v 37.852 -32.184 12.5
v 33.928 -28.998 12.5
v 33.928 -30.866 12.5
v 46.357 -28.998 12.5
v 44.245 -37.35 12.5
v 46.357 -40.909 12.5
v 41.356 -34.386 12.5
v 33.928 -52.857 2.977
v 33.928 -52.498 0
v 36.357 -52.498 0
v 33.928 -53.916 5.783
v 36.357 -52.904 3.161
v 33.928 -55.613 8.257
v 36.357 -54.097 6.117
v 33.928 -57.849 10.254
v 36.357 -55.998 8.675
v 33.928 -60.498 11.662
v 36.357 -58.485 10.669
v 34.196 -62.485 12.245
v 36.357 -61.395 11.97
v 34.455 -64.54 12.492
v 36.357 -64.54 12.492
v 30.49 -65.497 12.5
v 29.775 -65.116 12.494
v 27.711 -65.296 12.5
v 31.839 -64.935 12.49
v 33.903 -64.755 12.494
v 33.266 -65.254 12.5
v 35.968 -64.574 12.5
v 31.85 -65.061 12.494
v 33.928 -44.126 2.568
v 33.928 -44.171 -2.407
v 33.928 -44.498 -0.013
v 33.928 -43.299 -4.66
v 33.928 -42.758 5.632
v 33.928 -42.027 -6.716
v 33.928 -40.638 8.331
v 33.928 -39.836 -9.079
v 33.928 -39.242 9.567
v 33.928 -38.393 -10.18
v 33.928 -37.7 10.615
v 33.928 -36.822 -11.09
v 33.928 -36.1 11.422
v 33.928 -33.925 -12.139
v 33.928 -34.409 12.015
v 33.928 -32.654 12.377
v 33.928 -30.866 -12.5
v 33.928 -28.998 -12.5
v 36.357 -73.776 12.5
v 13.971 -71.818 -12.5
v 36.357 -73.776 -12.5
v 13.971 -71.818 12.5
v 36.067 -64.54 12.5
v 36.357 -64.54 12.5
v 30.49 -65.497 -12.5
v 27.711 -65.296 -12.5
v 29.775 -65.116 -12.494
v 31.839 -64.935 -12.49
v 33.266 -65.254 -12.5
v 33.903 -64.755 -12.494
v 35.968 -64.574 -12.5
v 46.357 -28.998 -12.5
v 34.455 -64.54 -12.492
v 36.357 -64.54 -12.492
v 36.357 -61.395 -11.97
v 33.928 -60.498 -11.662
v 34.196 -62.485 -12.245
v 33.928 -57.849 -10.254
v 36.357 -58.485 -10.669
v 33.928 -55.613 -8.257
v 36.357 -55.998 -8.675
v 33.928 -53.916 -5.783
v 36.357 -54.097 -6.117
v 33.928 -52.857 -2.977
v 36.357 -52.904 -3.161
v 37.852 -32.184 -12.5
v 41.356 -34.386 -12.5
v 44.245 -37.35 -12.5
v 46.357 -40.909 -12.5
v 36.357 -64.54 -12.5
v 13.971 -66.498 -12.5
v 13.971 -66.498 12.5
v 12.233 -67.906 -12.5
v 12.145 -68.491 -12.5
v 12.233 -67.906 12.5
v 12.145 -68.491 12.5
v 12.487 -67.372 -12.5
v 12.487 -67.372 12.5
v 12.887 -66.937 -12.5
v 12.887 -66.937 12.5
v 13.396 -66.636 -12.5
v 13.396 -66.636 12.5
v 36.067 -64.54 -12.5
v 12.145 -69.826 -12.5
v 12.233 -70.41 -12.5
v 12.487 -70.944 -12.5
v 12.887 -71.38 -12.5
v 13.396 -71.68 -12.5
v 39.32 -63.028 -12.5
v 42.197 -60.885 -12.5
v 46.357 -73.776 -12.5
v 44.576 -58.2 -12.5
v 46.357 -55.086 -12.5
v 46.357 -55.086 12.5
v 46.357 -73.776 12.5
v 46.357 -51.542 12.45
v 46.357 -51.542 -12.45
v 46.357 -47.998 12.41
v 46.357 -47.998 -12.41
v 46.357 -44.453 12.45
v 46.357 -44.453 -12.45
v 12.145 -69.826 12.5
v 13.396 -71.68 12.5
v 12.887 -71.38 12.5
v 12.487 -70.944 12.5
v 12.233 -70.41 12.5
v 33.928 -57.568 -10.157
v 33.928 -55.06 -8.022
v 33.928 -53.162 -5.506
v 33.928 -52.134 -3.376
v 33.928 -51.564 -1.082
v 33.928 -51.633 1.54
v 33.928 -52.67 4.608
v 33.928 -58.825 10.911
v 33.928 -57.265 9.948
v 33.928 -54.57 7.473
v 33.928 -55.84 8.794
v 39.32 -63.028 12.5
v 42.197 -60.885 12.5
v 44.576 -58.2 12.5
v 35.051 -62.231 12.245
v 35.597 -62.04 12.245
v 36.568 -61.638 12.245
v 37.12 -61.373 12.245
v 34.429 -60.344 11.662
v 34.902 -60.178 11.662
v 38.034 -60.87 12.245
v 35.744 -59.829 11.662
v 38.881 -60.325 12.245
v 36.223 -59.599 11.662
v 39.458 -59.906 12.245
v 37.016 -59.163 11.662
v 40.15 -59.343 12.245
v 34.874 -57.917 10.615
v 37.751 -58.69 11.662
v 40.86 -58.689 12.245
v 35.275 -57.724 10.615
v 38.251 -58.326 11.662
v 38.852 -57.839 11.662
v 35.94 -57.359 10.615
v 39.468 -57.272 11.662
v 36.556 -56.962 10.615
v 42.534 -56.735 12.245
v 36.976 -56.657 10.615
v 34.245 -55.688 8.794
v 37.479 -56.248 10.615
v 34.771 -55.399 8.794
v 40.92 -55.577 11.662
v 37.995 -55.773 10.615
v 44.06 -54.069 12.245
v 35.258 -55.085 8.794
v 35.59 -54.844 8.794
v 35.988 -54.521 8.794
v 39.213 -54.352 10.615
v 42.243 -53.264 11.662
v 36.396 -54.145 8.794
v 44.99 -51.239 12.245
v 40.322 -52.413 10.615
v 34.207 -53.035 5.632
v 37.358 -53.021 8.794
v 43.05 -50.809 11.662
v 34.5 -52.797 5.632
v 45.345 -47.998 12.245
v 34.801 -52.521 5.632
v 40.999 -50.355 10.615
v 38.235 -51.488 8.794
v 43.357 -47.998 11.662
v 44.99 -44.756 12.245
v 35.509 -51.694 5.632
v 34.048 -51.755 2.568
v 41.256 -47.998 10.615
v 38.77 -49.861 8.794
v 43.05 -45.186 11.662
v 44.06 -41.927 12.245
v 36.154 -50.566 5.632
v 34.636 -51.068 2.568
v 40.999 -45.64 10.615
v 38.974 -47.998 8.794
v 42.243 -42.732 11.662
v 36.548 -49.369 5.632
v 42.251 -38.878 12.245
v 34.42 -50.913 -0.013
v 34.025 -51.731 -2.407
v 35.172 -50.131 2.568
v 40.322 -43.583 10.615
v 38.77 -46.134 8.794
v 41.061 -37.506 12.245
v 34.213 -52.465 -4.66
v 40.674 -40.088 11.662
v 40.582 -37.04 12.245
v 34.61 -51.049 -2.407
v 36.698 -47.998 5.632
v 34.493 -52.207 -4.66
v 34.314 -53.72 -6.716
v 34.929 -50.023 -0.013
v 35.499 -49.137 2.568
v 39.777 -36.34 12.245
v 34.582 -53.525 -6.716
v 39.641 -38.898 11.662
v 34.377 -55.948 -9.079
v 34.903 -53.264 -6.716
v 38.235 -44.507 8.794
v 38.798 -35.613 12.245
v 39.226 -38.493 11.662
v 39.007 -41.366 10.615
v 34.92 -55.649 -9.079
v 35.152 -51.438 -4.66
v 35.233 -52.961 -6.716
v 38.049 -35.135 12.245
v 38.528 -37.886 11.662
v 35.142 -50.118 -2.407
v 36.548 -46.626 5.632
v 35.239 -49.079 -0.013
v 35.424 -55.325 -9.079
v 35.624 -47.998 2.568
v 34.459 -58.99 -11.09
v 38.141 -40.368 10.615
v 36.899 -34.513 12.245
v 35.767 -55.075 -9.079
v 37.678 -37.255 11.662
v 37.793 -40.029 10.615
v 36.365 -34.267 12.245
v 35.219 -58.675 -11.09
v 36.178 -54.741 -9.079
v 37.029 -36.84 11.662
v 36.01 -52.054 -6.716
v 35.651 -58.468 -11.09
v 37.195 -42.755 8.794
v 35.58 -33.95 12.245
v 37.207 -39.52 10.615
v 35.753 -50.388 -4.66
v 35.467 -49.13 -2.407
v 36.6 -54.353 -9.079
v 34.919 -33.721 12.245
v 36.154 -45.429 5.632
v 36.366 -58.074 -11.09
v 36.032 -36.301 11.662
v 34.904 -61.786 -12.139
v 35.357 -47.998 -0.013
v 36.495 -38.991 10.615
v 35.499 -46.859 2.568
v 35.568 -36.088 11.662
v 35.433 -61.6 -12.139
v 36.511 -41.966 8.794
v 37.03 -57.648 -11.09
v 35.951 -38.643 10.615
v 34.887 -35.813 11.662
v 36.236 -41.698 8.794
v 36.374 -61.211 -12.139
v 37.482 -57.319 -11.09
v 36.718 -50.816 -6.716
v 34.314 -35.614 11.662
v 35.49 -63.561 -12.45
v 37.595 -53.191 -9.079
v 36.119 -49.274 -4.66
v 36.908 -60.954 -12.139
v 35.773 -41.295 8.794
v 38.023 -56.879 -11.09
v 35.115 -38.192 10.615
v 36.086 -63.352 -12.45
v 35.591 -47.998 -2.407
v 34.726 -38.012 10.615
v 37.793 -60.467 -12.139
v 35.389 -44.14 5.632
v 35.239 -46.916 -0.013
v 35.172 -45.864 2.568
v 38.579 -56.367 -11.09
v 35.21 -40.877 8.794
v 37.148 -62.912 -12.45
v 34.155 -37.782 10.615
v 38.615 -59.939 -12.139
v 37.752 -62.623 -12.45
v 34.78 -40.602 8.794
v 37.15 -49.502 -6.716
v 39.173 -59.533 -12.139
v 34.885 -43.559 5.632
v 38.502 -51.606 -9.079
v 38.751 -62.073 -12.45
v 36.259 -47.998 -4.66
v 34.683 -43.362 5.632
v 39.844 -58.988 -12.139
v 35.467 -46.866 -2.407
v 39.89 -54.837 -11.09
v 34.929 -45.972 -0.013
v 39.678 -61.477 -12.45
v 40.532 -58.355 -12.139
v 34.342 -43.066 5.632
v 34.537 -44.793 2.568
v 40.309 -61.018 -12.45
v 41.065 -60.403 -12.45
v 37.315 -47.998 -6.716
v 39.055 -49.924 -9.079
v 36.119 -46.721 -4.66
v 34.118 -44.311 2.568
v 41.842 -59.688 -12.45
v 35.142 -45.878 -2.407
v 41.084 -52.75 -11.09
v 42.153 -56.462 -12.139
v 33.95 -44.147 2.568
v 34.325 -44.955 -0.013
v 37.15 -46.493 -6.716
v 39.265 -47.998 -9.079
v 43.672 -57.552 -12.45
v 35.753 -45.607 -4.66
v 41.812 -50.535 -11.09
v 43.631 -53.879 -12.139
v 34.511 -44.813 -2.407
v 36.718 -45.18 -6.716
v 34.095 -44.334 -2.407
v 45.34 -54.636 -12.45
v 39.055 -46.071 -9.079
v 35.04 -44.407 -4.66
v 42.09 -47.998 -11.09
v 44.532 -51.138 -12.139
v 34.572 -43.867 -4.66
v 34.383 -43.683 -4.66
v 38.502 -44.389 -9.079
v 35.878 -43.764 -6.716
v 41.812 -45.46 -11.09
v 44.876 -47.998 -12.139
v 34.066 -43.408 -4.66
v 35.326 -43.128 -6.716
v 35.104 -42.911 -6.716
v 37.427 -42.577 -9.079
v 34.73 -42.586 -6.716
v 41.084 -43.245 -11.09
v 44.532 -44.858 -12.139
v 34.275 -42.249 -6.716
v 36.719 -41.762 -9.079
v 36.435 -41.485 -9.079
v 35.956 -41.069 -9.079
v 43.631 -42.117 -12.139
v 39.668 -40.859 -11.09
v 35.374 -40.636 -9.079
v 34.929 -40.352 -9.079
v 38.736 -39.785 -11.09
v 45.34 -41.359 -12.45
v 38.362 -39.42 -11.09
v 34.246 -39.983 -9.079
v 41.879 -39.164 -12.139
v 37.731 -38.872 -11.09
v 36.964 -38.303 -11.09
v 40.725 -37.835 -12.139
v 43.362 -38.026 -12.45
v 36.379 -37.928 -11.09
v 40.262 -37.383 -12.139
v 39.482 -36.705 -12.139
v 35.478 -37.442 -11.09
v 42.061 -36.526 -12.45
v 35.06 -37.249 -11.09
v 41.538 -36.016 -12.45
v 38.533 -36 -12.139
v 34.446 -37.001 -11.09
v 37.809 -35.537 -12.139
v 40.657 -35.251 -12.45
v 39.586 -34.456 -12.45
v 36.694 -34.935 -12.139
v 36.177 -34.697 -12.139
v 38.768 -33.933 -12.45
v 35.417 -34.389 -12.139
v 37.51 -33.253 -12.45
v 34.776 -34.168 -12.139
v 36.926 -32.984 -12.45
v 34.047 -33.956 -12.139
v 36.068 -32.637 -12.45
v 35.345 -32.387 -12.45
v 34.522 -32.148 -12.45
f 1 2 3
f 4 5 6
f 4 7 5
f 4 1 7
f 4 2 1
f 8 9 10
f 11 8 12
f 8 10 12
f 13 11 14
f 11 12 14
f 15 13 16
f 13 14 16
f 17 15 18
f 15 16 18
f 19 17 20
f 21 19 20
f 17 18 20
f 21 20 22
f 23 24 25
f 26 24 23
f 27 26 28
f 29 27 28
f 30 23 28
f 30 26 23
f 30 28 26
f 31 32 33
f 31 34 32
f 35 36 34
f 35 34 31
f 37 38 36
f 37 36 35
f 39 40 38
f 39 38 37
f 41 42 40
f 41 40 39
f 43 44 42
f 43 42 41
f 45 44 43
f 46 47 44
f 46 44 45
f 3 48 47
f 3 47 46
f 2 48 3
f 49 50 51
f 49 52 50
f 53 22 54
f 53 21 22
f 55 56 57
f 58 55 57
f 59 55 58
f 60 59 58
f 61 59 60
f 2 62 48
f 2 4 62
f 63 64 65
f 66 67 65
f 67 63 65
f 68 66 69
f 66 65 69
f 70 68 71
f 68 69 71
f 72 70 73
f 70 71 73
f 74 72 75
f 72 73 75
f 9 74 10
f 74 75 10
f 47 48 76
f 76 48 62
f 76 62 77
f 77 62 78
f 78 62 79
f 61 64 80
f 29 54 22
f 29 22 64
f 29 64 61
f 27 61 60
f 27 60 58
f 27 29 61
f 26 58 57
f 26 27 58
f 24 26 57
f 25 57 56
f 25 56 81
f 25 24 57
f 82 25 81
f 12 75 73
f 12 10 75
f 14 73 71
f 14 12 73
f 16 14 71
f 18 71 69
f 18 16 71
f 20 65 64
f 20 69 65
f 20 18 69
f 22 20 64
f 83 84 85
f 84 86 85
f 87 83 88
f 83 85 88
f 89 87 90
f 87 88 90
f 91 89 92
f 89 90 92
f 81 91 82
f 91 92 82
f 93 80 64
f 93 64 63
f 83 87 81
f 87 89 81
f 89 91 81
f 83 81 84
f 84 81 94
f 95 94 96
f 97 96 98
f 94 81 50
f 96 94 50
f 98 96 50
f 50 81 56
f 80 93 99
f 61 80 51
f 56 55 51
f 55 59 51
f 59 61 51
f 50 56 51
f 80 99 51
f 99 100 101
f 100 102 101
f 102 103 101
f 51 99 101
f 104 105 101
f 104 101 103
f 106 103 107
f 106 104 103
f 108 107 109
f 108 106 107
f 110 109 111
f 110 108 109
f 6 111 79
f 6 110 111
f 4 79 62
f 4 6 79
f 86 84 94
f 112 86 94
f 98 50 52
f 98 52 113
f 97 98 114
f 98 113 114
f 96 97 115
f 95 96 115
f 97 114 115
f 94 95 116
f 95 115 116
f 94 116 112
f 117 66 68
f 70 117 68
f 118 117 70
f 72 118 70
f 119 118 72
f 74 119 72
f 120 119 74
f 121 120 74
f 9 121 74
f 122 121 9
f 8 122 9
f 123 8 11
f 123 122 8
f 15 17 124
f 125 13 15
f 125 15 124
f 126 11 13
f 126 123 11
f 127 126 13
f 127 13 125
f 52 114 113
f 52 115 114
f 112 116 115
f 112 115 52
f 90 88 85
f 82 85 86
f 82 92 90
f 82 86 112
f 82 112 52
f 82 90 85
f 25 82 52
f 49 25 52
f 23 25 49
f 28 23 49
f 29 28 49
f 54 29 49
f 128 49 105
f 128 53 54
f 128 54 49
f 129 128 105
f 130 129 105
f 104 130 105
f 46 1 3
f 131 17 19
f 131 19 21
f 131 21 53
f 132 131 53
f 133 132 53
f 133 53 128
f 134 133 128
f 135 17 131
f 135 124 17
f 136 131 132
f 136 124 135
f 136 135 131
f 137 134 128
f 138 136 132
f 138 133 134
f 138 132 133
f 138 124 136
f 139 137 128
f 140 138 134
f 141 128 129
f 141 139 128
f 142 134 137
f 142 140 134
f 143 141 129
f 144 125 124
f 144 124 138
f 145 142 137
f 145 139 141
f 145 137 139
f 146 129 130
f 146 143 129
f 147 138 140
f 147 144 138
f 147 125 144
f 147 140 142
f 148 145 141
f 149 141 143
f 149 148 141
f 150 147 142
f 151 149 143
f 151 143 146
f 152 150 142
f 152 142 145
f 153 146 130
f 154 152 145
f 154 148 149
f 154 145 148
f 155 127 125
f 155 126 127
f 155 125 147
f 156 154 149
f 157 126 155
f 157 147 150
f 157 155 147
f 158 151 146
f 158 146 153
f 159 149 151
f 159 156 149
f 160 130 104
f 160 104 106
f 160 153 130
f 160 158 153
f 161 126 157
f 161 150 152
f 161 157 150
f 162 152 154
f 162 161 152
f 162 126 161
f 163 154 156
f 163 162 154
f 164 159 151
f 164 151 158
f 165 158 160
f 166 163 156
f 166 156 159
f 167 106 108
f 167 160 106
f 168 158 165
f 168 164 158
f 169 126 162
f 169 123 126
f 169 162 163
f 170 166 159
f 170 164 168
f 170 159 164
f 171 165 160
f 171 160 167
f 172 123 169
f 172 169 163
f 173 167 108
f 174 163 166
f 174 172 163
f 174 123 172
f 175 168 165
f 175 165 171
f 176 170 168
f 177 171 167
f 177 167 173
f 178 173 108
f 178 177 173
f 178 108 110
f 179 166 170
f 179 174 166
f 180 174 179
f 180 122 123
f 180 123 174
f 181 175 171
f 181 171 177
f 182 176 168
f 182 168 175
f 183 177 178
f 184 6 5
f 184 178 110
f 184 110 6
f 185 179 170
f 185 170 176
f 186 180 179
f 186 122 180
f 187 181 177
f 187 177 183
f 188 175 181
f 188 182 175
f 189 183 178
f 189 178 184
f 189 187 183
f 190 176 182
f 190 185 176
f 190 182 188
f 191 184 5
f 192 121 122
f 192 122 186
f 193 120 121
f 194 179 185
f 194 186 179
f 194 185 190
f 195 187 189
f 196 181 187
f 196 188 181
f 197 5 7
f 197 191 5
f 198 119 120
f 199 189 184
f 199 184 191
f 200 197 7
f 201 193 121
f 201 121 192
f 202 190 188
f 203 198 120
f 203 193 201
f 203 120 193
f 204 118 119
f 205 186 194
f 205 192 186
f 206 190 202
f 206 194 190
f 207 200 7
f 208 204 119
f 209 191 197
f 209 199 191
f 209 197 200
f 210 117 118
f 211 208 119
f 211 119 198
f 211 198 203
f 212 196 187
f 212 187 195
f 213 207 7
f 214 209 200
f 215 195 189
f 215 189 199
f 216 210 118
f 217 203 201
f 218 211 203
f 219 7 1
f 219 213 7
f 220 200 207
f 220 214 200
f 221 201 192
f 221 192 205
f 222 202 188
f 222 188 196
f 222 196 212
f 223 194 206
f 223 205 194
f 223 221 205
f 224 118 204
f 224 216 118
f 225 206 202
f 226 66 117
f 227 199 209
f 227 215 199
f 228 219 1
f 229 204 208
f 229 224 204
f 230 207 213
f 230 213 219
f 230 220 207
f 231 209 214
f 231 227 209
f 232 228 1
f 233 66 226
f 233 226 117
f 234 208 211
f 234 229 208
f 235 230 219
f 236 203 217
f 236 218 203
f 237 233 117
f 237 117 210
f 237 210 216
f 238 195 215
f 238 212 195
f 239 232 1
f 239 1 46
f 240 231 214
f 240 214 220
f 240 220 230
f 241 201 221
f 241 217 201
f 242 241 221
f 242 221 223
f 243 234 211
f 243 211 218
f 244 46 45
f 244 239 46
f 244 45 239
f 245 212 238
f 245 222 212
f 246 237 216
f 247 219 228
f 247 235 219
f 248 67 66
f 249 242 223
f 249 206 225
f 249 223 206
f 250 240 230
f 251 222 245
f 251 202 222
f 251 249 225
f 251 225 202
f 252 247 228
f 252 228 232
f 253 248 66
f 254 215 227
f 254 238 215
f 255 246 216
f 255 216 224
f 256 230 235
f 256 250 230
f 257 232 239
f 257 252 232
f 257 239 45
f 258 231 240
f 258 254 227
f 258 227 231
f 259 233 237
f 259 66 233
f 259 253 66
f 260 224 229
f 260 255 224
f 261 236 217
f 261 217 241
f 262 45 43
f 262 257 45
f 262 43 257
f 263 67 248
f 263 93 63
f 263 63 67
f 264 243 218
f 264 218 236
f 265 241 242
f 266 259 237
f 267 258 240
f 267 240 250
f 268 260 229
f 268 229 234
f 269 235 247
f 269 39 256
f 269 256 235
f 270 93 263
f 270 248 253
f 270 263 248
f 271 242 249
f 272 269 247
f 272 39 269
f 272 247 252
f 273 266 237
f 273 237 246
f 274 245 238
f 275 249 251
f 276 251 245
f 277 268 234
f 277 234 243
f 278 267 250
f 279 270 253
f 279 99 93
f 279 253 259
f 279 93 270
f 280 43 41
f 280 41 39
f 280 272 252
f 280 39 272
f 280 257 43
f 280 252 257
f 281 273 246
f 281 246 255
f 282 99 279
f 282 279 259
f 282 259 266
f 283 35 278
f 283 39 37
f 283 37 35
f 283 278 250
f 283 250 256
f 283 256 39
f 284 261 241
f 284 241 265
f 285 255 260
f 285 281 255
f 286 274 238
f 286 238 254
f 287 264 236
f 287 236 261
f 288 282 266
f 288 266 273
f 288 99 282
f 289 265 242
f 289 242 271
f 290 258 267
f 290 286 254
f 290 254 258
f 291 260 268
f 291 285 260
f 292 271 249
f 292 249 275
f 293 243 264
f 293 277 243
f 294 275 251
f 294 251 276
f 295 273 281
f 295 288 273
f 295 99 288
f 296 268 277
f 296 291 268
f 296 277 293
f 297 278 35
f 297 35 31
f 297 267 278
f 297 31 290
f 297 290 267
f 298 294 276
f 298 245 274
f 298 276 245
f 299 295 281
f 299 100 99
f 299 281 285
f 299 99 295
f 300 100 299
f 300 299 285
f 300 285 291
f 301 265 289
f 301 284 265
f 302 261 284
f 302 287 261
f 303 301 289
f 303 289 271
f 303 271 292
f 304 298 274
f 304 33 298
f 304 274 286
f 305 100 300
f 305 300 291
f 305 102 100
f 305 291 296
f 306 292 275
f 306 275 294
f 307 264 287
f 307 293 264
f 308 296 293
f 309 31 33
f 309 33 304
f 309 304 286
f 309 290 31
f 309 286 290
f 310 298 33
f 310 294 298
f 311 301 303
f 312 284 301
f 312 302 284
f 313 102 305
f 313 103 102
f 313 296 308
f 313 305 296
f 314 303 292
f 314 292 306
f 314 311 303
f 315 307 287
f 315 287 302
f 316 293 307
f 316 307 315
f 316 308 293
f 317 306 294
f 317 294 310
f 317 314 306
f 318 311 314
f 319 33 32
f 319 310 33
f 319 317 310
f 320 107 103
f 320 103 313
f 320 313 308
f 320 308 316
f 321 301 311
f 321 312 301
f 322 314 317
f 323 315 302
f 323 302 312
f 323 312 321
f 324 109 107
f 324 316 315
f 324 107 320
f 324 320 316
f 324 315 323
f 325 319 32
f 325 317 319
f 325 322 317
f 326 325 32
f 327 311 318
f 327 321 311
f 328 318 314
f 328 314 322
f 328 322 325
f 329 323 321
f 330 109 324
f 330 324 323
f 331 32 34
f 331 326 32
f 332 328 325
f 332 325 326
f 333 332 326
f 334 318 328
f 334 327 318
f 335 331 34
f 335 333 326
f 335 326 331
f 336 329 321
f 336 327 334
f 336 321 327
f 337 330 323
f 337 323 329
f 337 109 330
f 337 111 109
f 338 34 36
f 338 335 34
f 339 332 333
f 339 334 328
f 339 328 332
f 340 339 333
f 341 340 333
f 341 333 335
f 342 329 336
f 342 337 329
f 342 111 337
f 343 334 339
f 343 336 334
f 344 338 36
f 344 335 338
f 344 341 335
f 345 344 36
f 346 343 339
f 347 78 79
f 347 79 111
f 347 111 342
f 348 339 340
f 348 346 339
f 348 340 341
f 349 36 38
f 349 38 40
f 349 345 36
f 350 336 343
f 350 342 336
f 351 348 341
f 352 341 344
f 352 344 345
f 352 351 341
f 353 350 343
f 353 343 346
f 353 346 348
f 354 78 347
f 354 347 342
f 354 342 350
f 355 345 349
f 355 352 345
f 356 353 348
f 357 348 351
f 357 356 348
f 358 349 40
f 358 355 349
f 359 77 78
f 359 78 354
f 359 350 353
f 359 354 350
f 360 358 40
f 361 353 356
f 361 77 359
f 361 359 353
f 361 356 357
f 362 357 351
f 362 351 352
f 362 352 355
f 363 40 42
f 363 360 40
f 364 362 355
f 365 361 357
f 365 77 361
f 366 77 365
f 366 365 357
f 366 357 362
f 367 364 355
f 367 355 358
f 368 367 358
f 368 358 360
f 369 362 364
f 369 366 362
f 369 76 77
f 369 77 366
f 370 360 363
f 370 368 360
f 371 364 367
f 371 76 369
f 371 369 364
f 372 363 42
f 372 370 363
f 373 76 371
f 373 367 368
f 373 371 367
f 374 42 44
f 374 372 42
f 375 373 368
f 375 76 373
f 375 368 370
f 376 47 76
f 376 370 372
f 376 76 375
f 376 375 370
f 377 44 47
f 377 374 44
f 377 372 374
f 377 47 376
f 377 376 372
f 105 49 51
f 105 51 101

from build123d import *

# Parameters (mm, degrees)
BOSS_EXTRUDE1_DEPTH = 12.5
BOSS_EXTRUDE2_DEPTH = 2.429285786
FILLET2_R           = 2


with BuildPart() as part:
    # Sketch2 → Boss-Extrude1 (new, symmetric)
    with BuildSketch(Plane.XY):
        Polygon((33.927983868, -28.997706932), (33.927983868, -52.497706932), (36.357269654, -52.497706932), (36.357269654, -64.539943653), (12.14546184, -66.65820236), (12.14546184, -71.65820236), (36.357269654, -73.776461068), (46.357269654, -73.776461068), (46.357269654, -28.997706932), align=None)
    extrude(amount=BOSS_EXTRUDE1_DEPTH, both=True)

    # Sketch4 → Boss-Extrude2 (add)
    with BuildSketch(Plane.ZY.offset(-36.357269654)):
        with BuildLine():
            Line((-12.5, -52.497706932), (-12.5, -64.539943653))
            Line((-12.5, -64.539943653), (-12.491615299, -64.539943653))
            ThreePointArc((-12.491615299, -64.539943653), (-8.675481514, -55.998483605), (0, -52.497706932))
            Line((0, -52.497706932), (-12.5, -52.497706932))
        make_face()
        with BuildLine():
            Line((12.5, -52.497706932), (0, -52.497706932))
            ThreePointArc((0, -52.497706932), (8.675481514, -55.998483605), (12.491615299, -64.539943653))
            Line((12.491615299, -64.539943653), (12.5, -64.539943653))
            Line((12.5, -64.539943653), (12.5, -52.497706932))
        make_face()
    extrude(amount=BOSS_EXTRUDE2_DEPTH)

    # Sketch3 → Cut-Revolve1 (revolve, cut)
    with BuildSketch(Plane.ZY.offset(-30.357269654)):
        with BuildLine():
            Line((-12.5, -47.997706932), (12.5, -47.997706932))
            Line((12.5, -47.997706932), (12.5, -30.497706932))
            ThreePointArc((12.5, -30.497706932), (0, -42.997706932), (-12.5, -30.497706932))
            Line((-12.5, -30.497706932), (-12.5, -47.997706932))
        make_face()
    revolve(axis=Axis((30.357269654, -47.997706932, -12.5), (0, 0, 1)), mode=Mode.SUBTRACT)

    # Fillet2
    fillet2_edges = [part.edges().sort_by_distance(p)[0] for p in [
        (12.14546184, -71.65820236, 0),
        (12.14546184, -66.65820236, 0),
    ]]
    fillet(fillet2_edges, radius=FILLET2_R)


solid = part.part
